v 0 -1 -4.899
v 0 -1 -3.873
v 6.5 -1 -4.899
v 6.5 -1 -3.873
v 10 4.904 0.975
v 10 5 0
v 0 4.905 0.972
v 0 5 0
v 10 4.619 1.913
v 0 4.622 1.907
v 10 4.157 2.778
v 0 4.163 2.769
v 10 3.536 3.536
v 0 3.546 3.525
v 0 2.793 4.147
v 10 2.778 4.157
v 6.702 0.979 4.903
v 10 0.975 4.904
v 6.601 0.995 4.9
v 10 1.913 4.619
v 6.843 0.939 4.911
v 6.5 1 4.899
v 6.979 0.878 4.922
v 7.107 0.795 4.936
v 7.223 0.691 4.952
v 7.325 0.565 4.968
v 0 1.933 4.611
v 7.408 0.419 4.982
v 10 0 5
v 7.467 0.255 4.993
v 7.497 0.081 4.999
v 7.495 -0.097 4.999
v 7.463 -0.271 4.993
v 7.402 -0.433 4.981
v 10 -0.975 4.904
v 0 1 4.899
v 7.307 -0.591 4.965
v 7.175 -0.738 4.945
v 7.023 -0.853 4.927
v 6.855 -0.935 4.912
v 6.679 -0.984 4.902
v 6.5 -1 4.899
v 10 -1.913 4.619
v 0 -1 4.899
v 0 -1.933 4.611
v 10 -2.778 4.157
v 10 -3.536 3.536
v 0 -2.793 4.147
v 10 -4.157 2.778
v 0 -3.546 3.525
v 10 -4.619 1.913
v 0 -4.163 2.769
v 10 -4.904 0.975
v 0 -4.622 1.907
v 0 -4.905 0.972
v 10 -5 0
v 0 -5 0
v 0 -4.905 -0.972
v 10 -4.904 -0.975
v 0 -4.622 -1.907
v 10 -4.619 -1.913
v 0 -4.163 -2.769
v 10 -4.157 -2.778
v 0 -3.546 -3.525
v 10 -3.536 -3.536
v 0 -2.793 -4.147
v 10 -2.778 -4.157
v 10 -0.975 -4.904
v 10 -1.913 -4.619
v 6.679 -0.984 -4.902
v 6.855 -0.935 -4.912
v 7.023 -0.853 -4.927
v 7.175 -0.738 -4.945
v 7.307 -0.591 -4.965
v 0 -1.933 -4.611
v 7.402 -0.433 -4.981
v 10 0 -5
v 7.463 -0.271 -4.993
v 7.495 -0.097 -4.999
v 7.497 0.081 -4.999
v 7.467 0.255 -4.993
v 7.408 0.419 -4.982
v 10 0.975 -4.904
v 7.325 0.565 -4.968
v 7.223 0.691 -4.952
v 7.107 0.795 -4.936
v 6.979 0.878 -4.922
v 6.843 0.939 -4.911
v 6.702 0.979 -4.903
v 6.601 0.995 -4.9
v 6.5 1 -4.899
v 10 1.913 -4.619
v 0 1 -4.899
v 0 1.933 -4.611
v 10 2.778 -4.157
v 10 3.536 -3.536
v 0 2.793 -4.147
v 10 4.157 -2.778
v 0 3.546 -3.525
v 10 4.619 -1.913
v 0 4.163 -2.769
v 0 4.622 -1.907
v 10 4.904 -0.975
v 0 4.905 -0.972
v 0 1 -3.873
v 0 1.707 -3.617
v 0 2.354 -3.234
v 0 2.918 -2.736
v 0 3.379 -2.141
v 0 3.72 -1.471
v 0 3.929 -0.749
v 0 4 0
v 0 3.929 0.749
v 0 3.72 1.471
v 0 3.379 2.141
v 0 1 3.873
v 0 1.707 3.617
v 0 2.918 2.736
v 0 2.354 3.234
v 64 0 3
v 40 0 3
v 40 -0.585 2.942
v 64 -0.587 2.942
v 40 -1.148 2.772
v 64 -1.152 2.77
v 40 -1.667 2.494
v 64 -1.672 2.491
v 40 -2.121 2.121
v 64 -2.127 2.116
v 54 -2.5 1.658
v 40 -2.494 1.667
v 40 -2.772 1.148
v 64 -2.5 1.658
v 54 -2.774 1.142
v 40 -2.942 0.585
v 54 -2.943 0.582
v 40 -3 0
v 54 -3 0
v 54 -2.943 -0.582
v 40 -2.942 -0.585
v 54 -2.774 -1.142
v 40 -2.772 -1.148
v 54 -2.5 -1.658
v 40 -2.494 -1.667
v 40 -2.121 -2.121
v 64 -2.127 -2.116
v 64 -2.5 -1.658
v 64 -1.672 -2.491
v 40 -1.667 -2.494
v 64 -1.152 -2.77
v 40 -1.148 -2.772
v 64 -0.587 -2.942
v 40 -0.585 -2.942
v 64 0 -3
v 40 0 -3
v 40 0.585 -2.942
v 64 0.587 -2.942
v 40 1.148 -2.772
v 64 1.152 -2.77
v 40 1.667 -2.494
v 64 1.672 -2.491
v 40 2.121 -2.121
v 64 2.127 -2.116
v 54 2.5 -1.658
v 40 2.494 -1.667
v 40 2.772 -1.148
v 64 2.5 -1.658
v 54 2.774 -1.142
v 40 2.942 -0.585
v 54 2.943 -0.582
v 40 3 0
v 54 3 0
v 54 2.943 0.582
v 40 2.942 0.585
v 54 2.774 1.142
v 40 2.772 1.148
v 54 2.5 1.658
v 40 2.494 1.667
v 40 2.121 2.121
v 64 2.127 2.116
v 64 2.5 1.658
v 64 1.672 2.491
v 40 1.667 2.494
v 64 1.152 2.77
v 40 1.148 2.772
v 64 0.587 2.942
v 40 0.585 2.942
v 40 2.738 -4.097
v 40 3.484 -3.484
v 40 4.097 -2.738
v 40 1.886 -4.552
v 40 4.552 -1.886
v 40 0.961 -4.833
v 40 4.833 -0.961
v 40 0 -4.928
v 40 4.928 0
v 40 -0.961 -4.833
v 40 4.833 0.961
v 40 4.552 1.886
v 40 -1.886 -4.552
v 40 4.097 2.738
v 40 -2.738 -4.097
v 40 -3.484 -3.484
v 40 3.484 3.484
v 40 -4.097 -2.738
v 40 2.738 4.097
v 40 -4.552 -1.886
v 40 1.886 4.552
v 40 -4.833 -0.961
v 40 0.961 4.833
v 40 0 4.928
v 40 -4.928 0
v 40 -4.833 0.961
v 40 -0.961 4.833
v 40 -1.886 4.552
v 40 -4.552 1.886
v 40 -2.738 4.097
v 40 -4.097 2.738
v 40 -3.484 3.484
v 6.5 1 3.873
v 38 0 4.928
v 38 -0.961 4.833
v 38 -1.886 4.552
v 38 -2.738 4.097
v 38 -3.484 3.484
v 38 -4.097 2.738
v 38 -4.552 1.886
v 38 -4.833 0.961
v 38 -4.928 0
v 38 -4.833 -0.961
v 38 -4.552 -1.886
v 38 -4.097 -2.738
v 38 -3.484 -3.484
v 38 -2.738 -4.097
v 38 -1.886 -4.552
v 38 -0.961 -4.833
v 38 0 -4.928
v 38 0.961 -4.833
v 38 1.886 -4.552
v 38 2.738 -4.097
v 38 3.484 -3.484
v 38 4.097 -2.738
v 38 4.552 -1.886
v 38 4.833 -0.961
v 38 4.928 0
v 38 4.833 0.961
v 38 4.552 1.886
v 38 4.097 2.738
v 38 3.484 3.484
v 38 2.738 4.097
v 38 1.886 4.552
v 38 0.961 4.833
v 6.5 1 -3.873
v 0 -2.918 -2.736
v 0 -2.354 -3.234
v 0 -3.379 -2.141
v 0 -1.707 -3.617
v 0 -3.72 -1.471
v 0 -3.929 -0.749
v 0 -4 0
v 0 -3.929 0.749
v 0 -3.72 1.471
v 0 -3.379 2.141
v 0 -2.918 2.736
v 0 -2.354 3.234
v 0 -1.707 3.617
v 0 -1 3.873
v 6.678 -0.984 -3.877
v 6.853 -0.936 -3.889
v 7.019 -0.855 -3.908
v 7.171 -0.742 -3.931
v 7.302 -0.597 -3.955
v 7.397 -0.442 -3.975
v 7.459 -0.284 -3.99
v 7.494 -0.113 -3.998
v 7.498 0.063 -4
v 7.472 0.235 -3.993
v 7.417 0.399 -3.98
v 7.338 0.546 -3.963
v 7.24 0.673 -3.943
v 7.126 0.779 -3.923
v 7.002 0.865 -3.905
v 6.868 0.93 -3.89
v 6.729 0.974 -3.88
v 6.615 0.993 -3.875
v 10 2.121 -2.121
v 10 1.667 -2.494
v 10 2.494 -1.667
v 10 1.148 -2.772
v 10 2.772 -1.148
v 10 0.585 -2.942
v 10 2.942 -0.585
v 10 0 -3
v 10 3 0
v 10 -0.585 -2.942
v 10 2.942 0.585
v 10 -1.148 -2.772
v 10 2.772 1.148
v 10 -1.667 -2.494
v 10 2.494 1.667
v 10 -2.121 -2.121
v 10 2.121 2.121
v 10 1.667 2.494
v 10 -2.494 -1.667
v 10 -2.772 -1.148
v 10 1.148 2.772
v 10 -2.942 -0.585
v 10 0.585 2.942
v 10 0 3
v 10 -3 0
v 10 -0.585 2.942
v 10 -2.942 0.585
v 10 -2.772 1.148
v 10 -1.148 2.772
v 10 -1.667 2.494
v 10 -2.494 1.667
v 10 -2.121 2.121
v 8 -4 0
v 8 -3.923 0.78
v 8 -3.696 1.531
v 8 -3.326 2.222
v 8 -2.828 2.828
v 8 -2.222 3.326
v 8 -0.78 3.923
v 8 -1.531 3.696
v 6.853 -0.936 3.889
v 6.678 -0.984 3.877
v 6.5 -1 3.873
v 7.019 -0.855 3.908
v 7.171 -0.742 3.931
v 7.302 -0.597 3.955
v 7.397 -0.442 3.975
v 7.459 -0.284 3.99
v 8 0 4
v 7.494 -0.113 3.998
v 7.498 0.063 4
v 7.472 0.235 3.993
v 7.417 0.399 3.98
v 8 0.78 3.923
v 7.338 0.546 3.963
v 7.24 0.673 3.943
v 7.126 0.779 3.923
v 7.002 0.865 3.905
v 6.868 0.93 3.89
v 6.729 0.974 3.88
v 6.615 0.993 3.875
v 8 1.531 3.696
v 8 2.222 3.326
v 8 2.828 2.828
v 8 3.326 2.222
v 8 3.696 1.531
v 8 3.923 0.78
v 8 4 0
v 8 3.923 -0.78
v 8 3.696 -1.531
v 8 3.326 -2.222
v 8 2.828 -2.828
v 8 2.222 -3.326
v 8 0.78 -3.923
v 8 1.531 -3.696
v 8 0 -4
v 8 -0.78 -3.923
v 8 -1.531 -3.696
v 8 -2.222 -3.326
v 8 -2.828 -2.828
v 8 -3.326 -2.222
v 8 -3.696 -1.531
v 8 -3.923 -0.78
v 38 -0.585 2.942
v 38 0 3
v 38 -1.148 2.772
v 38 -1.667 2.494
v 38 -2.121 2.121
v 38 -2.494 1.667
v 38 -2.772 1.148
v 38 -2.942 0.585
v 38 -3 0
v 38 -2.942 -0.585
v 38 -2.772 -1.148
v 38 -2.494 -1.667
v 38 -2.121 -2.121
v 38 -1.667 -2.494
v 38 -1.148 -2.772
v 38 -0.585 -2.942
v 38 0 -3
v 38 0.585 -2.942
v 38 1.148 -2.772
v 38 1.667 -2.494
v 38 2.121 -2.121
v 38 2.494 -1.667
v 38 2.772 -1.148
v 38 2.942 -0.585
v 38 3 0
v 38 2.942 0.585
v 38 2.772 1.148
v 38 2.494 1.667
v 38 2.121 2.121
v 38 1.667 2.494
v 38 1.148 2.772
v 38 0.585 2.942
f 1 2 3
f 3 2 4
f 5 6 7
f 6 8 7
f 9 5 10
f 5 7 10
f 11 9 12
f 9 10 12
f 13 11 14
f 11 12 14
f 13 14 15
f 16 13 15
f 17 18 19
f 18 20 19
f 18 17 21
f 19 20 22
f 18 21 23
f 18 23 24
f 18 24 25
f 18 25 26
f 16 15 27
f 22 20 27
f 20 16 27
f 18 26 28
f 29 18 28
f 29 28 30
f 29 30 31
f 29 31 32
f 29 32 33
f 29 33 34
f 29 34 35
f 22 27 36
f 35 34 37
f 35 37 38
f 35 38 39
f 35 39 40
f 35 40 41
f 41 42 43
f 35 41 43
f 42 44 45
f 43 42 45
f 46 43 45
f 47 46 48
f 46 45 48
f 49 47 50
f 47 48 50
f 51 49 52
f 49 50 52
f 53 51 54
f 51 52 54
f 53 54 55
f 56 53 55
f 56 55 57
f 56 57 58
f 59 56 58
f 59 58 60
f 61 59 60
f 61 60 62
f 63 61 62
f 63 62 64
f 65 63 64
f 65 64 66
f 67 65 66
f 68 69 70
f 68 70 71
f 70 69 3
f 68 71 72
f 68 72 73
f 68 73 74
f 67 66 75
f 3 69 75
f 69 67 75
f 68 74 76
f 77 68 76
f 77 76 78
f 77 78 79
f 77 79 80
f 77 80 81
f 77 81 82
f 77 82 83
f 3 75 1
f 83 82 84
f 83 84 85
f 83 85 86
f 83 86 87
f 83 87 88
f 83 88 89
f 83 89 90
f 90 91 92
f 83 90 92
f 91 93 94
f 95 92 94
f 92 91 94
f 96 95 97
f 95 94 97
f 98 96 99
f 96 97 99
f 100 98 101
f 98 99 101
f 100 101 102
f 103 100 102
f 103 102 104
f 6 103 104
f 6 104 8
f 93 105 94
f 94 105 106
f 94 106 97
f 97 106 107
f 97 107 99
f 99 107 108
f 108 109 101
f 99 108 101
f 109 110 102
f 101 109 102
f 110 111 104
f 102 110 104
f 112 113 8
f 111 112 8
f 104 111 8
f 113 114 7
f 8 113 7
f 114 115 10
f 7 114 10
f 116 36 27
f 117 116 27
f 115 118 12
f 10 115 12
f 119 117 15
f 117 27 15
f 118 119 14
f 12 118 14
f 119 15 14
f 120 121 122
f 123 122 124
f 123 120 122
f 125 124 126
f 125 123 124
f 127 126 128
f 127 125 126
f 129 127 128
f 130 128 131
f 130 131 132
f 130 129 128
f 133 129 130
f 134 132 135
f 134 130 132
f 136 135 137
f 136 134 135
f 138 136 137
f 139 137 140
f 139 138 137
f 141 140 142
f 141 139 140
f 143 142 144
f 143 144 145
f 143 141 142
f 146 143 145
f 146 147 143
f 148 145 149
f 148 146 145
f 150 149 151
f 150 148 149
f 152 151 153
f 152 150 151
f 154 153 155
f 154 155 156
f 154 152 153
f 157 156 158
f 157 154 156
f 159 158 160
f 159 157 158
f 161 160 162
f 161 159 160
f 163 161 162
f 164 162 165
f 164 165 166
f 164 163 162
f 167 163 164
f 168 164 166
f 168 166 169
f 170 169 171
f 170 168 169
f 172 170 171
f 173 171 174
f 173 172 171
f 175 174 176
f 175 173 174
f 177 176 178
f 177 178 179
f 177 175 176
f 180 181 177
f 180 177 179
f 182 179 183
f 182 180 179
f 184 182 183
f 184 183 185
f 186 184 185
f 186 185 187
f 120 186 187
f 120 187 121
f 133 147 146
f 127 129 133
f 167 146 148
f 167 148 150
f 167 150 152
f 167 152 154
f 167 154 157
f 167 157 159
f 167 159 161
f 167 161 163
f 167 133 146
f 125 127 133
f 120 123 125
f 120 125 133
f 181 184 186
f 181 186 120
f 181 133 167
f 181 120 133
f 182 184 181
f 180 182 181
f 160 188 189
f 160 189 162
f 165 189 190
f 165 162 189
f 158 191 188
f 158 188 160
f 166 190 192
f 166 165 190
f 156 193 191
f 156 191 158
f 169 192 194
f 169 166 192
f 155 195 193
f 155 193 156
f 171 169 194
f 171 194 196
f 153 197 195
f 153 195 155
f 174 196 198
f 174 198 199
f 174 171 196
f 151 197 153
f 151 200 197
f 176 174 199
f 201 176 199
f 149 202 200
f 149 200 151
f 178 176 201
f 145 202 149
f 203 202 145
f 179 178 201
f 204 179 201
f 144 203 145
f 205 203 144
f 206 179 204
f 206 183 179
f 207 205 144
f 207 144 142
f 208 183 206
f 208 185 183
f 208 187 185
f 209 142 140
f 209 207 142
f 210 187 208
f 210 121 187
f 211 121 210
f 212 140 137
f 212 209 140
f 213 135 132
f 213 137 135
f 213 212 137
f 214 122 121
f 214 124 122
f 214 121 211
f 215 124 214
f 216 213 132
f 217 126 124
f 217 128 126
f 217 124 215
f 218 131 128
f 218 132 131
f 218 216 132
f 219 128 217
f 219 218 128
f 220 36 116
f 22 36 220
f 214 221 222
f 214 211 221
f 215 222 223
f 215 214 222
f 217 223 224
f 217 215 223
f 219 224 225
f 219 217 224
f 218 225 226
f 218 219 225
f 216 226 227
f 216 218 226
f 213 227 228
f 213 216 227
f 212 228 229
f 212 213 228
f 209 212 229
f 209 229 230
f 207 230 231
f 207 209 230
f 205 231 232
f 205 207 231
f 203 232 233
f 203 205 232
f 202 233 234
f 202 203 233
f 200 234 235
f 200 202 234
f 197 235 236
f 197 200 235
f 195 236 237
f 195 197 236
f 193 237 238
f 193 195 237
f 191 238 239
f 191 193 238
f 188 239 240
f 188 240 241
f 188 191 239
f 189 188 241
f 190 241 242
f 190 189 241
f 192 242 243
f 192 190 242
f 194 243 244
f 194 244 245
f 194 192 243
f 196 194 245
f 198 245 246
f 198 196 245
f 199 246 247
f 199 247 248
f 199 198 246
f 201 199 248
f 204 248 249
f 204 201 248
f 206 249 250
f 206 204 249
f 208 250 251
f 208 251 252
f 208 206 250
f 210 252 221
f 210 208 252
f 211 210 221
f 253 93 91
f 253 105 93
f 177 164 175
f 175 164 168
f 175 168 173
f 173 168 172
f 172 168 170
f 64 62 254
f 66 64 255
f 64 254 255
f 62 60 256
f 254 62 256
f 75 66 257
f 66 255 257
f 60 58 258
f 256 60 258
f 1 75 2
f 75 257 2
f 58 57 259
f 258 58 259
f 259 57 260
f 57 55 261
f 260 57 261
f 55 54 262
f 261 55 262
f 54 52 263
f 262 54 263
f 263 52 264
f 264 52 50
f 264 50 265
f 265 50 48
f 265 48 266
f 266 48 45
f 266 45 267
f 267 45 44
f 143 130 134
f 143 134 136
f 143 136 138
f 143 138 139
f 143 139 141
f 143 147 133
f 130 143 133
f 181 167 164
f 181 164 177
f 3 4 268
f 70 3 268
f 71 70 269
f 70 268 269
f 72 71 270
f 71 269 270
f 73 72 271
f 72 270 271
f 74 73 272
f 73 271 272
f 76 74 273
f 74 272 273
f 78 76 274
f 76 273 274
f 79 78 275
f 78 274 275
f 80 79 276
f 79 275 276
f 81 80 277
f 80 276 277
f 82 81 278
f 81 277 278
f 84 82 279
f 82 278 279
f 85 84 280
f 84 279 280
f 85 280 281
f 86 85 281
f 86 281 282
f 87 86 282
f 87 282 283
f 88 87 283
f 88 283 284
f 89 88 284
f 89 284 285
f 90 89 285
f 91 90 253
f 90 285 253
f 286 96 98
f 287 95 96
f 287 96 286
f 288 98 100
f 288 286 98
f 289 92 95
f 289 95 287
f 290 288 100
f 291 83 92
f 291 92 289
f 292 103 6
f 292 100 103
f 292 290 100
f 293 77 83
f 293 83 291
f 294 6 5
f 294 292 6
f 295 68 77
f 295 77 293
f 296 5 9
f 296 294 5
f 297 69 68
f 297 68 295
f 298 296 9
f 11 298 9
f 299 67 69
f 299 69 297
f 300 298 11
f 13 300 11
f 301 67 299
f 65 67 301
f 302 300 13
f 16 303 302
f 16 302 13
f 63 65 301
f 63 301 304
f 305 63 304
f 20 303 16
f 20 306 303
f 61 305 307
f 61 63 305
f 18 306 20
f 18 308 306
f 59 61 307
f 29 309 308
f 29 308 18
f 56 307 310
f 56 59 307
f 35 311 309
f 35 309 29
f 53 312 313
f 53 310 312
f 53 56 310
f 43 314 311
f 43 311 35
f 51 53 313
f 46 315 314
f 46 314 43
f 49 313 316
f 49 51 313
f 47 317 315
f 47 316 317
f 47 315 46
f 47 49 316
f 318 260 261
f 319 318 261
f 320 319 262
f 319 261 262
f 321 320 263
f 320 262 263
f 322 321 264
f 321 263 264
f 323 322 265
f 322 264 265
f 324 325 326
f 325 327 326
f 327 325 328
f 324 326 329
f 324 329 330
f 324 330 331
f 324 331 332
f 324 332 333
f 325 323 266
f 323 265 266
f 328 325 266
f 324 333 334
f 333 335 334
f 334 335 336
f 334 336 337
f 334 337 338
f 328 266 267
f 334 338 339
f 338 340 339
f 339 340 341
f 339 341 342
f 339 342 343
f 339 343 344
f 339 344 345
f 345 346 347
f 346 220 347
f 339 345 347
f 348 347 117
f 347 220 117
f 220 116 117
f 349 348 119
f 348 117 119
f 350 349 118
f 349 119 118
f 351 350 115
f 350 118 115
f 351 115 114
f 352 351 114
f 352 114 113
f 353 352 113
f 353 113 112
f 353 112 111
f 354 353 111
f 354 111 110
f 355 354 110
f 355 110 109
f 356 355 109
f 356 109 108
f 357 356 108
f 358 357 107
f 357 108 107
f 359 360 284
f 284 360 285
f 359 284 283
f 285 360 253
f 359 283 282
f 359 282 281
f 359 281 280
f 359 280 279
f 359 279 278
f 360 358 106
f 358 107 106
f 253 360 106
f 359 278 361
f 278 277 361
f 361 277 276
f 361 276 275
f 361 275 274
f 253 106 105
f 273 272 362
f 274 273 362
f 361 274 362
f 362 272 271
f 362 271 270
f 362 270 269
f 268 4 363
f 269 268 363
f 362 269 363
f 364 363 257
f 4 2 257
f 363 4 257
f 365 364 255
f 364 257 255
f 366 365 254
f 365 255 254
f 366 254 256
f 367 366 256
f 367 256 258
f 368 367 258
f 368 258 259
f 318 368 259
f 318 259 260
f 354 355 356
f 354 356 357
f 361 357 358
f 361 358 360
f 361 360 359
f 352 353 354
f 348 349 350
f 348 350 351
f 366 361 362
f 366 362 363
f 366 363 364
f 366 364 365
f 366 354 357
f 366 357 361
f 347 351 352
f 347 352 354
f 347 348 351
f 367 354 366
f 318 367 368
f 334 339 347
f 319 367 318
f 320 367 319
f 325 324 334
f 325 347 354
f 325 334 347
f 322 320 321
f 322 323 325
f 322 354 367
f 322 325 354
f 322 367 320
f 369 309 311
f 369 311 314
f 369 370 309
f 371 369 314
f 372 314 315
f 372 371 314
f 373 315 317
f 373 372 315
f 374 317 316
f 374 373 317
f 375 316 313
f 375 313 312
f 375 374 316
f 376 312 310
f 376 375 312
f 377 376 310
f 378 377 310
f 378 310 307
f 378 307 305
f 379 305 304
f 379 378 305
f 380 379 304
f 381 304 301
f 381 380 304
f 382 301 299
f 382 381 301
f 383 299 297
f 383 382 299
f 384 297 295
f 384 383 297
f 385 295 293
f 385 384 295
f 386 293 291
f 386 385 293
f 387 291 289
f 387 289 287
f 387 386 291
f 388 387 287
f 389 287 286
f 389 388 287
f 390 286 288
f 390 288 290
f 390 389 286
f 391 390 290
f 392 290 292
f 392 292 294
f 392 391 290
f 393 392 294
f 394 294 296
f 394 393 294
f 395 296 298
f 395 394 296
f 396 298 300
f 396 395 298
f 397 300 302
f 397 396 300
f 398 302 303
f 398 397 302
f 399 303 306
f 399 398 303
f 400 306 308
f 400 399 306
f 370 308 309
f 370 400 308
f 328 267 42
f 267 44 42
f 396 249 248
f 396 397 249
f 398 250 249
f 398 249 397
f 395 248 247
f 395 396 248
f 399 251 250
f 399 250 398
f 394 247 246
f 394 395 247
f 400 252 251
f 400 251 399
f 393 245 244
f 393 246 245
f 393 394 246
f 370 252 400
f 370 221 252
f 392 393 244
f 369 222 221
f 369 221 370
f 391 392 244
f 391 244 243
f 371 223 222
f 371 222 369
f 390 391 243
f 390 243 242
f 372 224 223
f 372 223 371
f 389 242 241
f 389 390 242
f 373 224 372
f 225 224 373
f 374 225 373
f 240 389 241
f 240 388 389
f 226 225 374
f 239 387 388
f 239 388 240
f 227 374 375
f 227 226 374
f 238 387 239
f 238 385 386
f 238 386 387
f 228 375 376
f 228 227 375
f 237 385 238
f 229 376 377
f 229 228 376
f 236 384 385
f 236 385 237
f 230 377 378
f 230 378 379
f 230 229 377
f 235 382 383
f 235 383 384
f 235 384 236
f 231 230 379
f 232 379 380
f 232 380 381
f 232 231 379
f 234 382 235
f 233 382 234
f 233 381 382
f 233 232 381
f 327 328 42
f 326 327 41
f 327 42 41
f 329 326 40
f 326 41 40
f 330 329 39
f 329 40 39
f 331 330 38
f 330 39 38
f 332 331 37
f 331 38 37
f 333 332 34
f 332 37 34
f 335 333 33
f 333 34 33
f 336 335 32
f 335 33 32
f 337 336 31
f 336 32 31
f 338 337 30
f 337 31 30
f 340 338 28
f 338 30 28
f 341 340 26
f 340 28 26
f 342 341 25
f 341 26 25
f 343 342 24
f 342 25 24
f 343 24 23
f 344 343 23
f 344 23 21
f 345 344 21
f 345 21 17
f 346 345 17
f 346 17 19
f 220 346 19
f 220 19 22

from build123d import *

# Parameters (mm, degrees)
F0_R     = 5
F1_DEPTH = 64
F4_W     = 18.964292
F4_H     = 17.682846
F4_W_2   = 5
F4_H_2   = 14.245734
F5_DEPTH = 10
F6_W     = 13
F6_H     = 2
F7_DEPTH = 12.5
F8_R     = 4
F9_DEPTH = 8


with BuildPart() as f1:
    # F0 (on Right) → F1 (new body)
    with BuildSketch(Plane.YZ):
        Circle(F0_R)
    extrude(amount=F1_DEPTH)

    # F2 (on Front) → F3 (revolve, cut)
    with BuildSketch(Plane.XZ):
        Polygon((10, 6.419506), (10, 3), (38, 3), (38, 4.927536), (40, 4.927536), (40, 3), (64, 3), (64, 6.419506), align=None)
    revolve(axis=Axis((28.04348, 0, 0), (1, 0, 0)), mode=Mode.SUBTRACT)

    # F4 (on face) → F5 (cut)
    with BuildSketch(Plane.YZ.offset(64)):
        Rectangle(F4_W, F4_H)
        Rectangle(F4_W_2, F4_H_2, mode=Mode.SUBTRACT)
    extrude(amount=-F5_DEPTH, mode=Mode.SUBTRACT)

    # F6 (on Top) → F7 (cut, symmetric)
    with BuildSketch(Plane.XY):
        Rectangle(F6_W, F6_H)
        with BuildLine():
            Line((6.5, 1), (6.5, -1))
            ThreePointArc((6.5, -1), (7.5, 0), (6.5, 1))
        make_face()
    extrude(amount=F7_DEPTH, both=True, mode=Mode.SUBTRACT)

    # F8 (on face) → F9 (cut)
    with BuildSketch(Plane(origin=(0, 0, 0), x_dir=(0, -1, 0), z_dir=(-1, 0, 0))):
        Circle(F8_R)
    extrude(amount=-F9_DEPTH, mode=Mode.SUBTRACT)


solid = f1.part
